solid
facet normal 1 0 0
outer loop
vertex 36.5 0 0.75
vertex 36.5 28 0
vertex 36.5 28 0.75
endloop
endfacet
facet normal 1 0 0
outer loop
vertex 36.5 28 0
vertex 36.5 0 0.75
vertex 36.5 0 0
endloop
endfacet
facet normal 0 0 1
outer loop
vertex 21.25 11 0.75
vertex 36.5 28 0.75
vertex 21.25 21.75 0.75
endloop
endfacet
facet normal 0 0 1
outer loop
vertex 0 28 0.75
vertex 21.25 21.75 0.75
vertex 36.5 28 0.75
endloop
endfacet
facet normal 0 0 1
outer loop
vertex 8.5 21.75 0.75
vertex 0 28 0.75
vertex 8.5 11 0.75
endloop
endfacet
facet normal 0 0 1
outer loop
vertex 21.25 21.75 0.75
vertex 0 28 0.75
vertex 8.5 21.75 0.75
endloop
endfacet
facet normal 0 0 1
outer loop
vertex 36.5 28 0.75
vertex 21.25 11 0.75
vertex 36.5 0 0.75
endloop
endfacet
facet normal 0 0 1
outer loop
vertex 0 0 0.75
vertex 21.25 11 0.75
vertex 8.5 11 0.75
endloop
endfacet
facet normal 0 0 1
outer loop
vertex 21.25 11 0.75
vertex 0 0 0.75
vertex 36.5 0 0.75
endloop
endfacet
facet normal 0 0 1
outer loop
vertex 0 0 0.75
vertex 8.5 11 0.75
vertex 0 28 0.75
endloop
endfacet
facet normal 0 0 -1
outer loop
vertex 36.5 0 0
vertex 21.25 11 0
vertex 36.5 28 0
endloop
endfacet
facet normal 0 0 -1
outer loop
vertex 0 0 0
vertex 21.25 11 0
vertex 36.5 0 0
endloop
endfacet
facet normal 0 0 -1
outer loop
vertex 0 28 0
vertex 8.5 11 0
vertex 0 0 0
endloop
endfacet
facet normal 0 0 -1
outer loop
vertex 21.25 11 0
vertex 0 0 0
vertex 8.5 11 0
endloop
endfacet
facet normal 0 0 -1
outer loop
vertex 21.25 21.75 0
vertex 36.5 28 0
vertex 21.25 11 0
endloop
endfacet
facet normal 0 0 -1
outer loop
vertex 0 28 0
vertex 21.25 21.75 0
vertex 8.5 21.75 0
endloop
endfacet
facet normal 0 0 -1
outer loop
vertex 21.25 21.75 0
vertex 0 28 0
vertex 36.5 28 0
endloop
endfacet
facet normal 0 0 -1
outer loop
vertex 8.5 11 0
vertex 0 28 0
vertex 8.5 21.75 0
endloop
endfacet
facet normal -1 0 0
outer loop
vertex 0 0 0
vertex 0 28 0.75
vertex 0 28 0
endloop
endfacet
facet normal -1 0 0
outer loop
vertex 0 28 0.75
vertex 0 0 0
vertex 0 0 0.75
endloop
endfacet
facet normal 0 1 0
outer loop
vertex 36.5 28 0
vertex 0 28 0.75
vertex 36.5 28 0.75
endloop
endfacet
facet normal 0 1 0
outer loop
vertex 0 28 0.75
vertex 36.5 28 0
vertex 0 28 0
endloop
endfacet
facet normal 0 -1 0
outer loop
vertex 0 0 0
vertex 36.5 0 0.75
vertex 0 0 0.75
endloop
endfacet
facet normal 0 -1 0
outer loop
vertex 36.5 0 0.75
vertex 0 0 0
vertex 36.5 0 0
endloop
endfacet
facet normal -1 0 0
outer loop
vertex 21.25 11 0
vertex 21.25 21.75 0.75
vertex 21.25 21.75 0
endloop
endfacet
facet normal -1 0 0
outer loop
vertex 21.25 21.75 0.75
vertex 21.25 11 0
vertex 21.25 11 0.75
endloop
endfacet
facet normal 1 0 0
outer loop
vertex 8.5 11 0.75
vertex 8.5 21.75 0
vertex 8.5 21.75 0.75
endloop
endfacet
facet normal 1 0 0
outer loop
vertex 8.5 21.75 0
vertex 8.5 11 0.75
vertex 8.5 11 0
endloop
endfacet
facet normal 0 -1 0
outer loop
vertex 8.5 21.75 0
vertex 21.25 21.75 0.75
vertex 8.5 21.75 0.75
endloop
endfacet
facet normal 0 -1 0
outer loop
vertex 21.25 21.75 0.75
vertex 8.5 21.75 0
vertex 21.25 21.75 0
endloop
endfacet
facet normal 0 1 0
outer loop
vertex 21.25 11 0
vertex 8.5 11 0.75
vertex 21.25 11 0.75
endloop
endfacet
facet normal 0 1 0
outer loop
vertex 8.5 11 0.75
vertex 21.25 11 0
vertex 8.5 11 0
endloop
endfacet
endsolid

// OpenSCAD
/*
    Projekt Name: Trennwaende fuer das Modellhaus 3723
    Modul:  Wand Westseite
    Projekt URL: https://github.com/Hardi-St/MobaLedLib_Docu/tree/master/3D_Daten_fuer_die_MobaLedLib/Trennwände%20für%20Häuser
    Version: 0.0.1
    Autor: Moba-Nick (mobanick@wp12085804.server-he.de)
    Lizenz: CC-BY-SA-4.0 (https://creativecommons.org/licenses/by-sa/4.0/legalcode.de)
*/
//  Alle Angaben sind immer in mm bei meinen Projekten.
//  Parameter fuer die Wand
x_all = 36.5;  //Breite der Wand = Breite der Grundplatte
z_all = 0.75; //Wandstaerke gibnt an, wie Dick die Wand ist. 0.75 ist dick genug um kein Licht durchzulassen, aber duenn genug um Material zu sparen.
y_erdgeschoss = 28;     //Hoehe Erdgeschoss 

difference(){
    HauptWand(2);
    Fenster(28,11,12.75,10.75);
}



/* 
!!!!!!!!!!!!!!!!!!!!!!!!!!!!!!!!!!!!!!!!!!!!!!!!!!!!!!!!!!!!!!!!!!!    
!!!!    Ab hier kommen die Module. Bitte nur aendern wann man   !!!!
!!!!    weiss was man macht.                                    !!!!
!!!!!!!!!!!!!!!!!!!!!!!!!!!!!!!!!!!!!!!!!!!!!!!!!!!!!!!!!!!!!!!!!!!
/*  
    Das Module HauptWand erstellt die Wand des Hauses inkl. der Dachschraege aus einen Polyhydron. Dazu wurde im Bereich fuer die Parameter in den  Zeilen 10 - 14 die Werte fuer die Breite der Wand (x_all) sowie die Höhe des Erdgeschosses (y_erdgeschoss) und des oberen Stockwerks (y_dachschraege) angeben.
*/

module HauptWand(typ){
  if (typ == 1){    //mit Dachschräge
        //  PolyPunkte gibt an wo sicher welcher Punkt befindet. 
        //  Die Korrdinaten werden immer im Format [x,y,z] uebergeben.
        PolyPunkte = [
        [0,0,0],    // 0
        [0,y_erdgeschoss,0],    // 1
        [x_all/2,y_all,0],    // 2
        [x_all,y_erdgeschoss,0],    // 3
        [x_all,0,0],    // 4
        [0,0,z_all],    // 5
        [x_all,0,z_all],    // 6
        [x_all,y_erdgeschoss,z_all],    // 7
        [x_all/2,y_all,z_all],    // 8
        [0,y_erdgeschoss,z_all]];    // 9
        
        //  PolyFlaechen gibt an welche Punkte welche Flaechen beschreiben. 
        //  Die Korrdinaten werden immer im Format [x,y,z] uebergeben.
        PolyFlaechen =[
        [0,1,2,3,4],    // Unten (Boden)
        [5,0,4,6],      // Vorne (vordere Kante)
        [6,4,3,7],      // Rechts unten (Erdgeschoss)
        [7,3,2,8],      // Rechts oben  (Dachgeschoss/Dachschraege)
        [6,7,8,9,5],    // Oben (Deckel)
        [9,1,0,5],      // Links unten  (Erdgeschoss)
        [8,2,1,9]];     // Links oben   (Dachgeschoss/Dachschraege)
          
        polyhedron( PolyPunkte, PolyFlaechen );
    }else if (typ == 2){    //normale Wand ohne Dach
        cube([x_all,y_erdgeschoss,z_all],false);
    }else{
        
    }
}

/*  
    Das Module Fenster erstellt wie der Name schon sagt, die Ausschnitte fuer die Fenster.
    Dabei gibt es 4 Variablen die uebergeben werden.
    "pos_x" gibt die Startposition des linken unteren Ecke im Bezug zur Mittelachse des Hauses an.
    "pos_y" gibt die Startposition der inken untren Ecke im Bezug zur Grundplatte an.
    "size_x" gibt die Breite des Fensters an
    "size_y" gibt die Hoehe des Fensters an
    Beispiel: Der Befehl "Fenster(10,20,15,10);" erzeugt ein Fenster 10mm von der Mitte nach Rechts, auf der Hoehe von 20mm mit einer Breite von 15mm und einer Hoehe von 10mm;
*/
module Fenster(pos_x, pos_y, size_x, size_y){
    translate([x_all-pos_x, pos_y, 0]){
        cube([size_x,size_y,z_all*1.25],false);
    }
}

/*  
    Das Module Fenster_rund erstellt wie der Name schon sagt, die Ausschnitte fuer die Fenster mit rundem Ausschnitt.
    Dabei gibt es 3 Variablen die uebergeben werden.
    "pos_x" gibt die Startposition der linken unteren Ecke im Bezug zur Mittelachse des Hauses an.
    "pos_y" gibt die Startposition der inken unteren Ecke im Bezug zur Grundplatte an.
    "size_x" gibt die Breite des Fensters an
    Beispiel: Der Befehl "Fenster_rund(10,20,5);" erzeugt ein Fenster 10mm von der Mitte nach Rechts, auf der Hoehe von 20mm mit einem Durchmesser von 5mm;
*/
module Fenster_Rund(pos_x, pos_y, size_x){
    
    translate([x_all/2+pos_x+size_x/2, pos_y+size_x/2, 0]){
        cylinder(h=z_all*1.25,d=size_x,false);
    }
}
